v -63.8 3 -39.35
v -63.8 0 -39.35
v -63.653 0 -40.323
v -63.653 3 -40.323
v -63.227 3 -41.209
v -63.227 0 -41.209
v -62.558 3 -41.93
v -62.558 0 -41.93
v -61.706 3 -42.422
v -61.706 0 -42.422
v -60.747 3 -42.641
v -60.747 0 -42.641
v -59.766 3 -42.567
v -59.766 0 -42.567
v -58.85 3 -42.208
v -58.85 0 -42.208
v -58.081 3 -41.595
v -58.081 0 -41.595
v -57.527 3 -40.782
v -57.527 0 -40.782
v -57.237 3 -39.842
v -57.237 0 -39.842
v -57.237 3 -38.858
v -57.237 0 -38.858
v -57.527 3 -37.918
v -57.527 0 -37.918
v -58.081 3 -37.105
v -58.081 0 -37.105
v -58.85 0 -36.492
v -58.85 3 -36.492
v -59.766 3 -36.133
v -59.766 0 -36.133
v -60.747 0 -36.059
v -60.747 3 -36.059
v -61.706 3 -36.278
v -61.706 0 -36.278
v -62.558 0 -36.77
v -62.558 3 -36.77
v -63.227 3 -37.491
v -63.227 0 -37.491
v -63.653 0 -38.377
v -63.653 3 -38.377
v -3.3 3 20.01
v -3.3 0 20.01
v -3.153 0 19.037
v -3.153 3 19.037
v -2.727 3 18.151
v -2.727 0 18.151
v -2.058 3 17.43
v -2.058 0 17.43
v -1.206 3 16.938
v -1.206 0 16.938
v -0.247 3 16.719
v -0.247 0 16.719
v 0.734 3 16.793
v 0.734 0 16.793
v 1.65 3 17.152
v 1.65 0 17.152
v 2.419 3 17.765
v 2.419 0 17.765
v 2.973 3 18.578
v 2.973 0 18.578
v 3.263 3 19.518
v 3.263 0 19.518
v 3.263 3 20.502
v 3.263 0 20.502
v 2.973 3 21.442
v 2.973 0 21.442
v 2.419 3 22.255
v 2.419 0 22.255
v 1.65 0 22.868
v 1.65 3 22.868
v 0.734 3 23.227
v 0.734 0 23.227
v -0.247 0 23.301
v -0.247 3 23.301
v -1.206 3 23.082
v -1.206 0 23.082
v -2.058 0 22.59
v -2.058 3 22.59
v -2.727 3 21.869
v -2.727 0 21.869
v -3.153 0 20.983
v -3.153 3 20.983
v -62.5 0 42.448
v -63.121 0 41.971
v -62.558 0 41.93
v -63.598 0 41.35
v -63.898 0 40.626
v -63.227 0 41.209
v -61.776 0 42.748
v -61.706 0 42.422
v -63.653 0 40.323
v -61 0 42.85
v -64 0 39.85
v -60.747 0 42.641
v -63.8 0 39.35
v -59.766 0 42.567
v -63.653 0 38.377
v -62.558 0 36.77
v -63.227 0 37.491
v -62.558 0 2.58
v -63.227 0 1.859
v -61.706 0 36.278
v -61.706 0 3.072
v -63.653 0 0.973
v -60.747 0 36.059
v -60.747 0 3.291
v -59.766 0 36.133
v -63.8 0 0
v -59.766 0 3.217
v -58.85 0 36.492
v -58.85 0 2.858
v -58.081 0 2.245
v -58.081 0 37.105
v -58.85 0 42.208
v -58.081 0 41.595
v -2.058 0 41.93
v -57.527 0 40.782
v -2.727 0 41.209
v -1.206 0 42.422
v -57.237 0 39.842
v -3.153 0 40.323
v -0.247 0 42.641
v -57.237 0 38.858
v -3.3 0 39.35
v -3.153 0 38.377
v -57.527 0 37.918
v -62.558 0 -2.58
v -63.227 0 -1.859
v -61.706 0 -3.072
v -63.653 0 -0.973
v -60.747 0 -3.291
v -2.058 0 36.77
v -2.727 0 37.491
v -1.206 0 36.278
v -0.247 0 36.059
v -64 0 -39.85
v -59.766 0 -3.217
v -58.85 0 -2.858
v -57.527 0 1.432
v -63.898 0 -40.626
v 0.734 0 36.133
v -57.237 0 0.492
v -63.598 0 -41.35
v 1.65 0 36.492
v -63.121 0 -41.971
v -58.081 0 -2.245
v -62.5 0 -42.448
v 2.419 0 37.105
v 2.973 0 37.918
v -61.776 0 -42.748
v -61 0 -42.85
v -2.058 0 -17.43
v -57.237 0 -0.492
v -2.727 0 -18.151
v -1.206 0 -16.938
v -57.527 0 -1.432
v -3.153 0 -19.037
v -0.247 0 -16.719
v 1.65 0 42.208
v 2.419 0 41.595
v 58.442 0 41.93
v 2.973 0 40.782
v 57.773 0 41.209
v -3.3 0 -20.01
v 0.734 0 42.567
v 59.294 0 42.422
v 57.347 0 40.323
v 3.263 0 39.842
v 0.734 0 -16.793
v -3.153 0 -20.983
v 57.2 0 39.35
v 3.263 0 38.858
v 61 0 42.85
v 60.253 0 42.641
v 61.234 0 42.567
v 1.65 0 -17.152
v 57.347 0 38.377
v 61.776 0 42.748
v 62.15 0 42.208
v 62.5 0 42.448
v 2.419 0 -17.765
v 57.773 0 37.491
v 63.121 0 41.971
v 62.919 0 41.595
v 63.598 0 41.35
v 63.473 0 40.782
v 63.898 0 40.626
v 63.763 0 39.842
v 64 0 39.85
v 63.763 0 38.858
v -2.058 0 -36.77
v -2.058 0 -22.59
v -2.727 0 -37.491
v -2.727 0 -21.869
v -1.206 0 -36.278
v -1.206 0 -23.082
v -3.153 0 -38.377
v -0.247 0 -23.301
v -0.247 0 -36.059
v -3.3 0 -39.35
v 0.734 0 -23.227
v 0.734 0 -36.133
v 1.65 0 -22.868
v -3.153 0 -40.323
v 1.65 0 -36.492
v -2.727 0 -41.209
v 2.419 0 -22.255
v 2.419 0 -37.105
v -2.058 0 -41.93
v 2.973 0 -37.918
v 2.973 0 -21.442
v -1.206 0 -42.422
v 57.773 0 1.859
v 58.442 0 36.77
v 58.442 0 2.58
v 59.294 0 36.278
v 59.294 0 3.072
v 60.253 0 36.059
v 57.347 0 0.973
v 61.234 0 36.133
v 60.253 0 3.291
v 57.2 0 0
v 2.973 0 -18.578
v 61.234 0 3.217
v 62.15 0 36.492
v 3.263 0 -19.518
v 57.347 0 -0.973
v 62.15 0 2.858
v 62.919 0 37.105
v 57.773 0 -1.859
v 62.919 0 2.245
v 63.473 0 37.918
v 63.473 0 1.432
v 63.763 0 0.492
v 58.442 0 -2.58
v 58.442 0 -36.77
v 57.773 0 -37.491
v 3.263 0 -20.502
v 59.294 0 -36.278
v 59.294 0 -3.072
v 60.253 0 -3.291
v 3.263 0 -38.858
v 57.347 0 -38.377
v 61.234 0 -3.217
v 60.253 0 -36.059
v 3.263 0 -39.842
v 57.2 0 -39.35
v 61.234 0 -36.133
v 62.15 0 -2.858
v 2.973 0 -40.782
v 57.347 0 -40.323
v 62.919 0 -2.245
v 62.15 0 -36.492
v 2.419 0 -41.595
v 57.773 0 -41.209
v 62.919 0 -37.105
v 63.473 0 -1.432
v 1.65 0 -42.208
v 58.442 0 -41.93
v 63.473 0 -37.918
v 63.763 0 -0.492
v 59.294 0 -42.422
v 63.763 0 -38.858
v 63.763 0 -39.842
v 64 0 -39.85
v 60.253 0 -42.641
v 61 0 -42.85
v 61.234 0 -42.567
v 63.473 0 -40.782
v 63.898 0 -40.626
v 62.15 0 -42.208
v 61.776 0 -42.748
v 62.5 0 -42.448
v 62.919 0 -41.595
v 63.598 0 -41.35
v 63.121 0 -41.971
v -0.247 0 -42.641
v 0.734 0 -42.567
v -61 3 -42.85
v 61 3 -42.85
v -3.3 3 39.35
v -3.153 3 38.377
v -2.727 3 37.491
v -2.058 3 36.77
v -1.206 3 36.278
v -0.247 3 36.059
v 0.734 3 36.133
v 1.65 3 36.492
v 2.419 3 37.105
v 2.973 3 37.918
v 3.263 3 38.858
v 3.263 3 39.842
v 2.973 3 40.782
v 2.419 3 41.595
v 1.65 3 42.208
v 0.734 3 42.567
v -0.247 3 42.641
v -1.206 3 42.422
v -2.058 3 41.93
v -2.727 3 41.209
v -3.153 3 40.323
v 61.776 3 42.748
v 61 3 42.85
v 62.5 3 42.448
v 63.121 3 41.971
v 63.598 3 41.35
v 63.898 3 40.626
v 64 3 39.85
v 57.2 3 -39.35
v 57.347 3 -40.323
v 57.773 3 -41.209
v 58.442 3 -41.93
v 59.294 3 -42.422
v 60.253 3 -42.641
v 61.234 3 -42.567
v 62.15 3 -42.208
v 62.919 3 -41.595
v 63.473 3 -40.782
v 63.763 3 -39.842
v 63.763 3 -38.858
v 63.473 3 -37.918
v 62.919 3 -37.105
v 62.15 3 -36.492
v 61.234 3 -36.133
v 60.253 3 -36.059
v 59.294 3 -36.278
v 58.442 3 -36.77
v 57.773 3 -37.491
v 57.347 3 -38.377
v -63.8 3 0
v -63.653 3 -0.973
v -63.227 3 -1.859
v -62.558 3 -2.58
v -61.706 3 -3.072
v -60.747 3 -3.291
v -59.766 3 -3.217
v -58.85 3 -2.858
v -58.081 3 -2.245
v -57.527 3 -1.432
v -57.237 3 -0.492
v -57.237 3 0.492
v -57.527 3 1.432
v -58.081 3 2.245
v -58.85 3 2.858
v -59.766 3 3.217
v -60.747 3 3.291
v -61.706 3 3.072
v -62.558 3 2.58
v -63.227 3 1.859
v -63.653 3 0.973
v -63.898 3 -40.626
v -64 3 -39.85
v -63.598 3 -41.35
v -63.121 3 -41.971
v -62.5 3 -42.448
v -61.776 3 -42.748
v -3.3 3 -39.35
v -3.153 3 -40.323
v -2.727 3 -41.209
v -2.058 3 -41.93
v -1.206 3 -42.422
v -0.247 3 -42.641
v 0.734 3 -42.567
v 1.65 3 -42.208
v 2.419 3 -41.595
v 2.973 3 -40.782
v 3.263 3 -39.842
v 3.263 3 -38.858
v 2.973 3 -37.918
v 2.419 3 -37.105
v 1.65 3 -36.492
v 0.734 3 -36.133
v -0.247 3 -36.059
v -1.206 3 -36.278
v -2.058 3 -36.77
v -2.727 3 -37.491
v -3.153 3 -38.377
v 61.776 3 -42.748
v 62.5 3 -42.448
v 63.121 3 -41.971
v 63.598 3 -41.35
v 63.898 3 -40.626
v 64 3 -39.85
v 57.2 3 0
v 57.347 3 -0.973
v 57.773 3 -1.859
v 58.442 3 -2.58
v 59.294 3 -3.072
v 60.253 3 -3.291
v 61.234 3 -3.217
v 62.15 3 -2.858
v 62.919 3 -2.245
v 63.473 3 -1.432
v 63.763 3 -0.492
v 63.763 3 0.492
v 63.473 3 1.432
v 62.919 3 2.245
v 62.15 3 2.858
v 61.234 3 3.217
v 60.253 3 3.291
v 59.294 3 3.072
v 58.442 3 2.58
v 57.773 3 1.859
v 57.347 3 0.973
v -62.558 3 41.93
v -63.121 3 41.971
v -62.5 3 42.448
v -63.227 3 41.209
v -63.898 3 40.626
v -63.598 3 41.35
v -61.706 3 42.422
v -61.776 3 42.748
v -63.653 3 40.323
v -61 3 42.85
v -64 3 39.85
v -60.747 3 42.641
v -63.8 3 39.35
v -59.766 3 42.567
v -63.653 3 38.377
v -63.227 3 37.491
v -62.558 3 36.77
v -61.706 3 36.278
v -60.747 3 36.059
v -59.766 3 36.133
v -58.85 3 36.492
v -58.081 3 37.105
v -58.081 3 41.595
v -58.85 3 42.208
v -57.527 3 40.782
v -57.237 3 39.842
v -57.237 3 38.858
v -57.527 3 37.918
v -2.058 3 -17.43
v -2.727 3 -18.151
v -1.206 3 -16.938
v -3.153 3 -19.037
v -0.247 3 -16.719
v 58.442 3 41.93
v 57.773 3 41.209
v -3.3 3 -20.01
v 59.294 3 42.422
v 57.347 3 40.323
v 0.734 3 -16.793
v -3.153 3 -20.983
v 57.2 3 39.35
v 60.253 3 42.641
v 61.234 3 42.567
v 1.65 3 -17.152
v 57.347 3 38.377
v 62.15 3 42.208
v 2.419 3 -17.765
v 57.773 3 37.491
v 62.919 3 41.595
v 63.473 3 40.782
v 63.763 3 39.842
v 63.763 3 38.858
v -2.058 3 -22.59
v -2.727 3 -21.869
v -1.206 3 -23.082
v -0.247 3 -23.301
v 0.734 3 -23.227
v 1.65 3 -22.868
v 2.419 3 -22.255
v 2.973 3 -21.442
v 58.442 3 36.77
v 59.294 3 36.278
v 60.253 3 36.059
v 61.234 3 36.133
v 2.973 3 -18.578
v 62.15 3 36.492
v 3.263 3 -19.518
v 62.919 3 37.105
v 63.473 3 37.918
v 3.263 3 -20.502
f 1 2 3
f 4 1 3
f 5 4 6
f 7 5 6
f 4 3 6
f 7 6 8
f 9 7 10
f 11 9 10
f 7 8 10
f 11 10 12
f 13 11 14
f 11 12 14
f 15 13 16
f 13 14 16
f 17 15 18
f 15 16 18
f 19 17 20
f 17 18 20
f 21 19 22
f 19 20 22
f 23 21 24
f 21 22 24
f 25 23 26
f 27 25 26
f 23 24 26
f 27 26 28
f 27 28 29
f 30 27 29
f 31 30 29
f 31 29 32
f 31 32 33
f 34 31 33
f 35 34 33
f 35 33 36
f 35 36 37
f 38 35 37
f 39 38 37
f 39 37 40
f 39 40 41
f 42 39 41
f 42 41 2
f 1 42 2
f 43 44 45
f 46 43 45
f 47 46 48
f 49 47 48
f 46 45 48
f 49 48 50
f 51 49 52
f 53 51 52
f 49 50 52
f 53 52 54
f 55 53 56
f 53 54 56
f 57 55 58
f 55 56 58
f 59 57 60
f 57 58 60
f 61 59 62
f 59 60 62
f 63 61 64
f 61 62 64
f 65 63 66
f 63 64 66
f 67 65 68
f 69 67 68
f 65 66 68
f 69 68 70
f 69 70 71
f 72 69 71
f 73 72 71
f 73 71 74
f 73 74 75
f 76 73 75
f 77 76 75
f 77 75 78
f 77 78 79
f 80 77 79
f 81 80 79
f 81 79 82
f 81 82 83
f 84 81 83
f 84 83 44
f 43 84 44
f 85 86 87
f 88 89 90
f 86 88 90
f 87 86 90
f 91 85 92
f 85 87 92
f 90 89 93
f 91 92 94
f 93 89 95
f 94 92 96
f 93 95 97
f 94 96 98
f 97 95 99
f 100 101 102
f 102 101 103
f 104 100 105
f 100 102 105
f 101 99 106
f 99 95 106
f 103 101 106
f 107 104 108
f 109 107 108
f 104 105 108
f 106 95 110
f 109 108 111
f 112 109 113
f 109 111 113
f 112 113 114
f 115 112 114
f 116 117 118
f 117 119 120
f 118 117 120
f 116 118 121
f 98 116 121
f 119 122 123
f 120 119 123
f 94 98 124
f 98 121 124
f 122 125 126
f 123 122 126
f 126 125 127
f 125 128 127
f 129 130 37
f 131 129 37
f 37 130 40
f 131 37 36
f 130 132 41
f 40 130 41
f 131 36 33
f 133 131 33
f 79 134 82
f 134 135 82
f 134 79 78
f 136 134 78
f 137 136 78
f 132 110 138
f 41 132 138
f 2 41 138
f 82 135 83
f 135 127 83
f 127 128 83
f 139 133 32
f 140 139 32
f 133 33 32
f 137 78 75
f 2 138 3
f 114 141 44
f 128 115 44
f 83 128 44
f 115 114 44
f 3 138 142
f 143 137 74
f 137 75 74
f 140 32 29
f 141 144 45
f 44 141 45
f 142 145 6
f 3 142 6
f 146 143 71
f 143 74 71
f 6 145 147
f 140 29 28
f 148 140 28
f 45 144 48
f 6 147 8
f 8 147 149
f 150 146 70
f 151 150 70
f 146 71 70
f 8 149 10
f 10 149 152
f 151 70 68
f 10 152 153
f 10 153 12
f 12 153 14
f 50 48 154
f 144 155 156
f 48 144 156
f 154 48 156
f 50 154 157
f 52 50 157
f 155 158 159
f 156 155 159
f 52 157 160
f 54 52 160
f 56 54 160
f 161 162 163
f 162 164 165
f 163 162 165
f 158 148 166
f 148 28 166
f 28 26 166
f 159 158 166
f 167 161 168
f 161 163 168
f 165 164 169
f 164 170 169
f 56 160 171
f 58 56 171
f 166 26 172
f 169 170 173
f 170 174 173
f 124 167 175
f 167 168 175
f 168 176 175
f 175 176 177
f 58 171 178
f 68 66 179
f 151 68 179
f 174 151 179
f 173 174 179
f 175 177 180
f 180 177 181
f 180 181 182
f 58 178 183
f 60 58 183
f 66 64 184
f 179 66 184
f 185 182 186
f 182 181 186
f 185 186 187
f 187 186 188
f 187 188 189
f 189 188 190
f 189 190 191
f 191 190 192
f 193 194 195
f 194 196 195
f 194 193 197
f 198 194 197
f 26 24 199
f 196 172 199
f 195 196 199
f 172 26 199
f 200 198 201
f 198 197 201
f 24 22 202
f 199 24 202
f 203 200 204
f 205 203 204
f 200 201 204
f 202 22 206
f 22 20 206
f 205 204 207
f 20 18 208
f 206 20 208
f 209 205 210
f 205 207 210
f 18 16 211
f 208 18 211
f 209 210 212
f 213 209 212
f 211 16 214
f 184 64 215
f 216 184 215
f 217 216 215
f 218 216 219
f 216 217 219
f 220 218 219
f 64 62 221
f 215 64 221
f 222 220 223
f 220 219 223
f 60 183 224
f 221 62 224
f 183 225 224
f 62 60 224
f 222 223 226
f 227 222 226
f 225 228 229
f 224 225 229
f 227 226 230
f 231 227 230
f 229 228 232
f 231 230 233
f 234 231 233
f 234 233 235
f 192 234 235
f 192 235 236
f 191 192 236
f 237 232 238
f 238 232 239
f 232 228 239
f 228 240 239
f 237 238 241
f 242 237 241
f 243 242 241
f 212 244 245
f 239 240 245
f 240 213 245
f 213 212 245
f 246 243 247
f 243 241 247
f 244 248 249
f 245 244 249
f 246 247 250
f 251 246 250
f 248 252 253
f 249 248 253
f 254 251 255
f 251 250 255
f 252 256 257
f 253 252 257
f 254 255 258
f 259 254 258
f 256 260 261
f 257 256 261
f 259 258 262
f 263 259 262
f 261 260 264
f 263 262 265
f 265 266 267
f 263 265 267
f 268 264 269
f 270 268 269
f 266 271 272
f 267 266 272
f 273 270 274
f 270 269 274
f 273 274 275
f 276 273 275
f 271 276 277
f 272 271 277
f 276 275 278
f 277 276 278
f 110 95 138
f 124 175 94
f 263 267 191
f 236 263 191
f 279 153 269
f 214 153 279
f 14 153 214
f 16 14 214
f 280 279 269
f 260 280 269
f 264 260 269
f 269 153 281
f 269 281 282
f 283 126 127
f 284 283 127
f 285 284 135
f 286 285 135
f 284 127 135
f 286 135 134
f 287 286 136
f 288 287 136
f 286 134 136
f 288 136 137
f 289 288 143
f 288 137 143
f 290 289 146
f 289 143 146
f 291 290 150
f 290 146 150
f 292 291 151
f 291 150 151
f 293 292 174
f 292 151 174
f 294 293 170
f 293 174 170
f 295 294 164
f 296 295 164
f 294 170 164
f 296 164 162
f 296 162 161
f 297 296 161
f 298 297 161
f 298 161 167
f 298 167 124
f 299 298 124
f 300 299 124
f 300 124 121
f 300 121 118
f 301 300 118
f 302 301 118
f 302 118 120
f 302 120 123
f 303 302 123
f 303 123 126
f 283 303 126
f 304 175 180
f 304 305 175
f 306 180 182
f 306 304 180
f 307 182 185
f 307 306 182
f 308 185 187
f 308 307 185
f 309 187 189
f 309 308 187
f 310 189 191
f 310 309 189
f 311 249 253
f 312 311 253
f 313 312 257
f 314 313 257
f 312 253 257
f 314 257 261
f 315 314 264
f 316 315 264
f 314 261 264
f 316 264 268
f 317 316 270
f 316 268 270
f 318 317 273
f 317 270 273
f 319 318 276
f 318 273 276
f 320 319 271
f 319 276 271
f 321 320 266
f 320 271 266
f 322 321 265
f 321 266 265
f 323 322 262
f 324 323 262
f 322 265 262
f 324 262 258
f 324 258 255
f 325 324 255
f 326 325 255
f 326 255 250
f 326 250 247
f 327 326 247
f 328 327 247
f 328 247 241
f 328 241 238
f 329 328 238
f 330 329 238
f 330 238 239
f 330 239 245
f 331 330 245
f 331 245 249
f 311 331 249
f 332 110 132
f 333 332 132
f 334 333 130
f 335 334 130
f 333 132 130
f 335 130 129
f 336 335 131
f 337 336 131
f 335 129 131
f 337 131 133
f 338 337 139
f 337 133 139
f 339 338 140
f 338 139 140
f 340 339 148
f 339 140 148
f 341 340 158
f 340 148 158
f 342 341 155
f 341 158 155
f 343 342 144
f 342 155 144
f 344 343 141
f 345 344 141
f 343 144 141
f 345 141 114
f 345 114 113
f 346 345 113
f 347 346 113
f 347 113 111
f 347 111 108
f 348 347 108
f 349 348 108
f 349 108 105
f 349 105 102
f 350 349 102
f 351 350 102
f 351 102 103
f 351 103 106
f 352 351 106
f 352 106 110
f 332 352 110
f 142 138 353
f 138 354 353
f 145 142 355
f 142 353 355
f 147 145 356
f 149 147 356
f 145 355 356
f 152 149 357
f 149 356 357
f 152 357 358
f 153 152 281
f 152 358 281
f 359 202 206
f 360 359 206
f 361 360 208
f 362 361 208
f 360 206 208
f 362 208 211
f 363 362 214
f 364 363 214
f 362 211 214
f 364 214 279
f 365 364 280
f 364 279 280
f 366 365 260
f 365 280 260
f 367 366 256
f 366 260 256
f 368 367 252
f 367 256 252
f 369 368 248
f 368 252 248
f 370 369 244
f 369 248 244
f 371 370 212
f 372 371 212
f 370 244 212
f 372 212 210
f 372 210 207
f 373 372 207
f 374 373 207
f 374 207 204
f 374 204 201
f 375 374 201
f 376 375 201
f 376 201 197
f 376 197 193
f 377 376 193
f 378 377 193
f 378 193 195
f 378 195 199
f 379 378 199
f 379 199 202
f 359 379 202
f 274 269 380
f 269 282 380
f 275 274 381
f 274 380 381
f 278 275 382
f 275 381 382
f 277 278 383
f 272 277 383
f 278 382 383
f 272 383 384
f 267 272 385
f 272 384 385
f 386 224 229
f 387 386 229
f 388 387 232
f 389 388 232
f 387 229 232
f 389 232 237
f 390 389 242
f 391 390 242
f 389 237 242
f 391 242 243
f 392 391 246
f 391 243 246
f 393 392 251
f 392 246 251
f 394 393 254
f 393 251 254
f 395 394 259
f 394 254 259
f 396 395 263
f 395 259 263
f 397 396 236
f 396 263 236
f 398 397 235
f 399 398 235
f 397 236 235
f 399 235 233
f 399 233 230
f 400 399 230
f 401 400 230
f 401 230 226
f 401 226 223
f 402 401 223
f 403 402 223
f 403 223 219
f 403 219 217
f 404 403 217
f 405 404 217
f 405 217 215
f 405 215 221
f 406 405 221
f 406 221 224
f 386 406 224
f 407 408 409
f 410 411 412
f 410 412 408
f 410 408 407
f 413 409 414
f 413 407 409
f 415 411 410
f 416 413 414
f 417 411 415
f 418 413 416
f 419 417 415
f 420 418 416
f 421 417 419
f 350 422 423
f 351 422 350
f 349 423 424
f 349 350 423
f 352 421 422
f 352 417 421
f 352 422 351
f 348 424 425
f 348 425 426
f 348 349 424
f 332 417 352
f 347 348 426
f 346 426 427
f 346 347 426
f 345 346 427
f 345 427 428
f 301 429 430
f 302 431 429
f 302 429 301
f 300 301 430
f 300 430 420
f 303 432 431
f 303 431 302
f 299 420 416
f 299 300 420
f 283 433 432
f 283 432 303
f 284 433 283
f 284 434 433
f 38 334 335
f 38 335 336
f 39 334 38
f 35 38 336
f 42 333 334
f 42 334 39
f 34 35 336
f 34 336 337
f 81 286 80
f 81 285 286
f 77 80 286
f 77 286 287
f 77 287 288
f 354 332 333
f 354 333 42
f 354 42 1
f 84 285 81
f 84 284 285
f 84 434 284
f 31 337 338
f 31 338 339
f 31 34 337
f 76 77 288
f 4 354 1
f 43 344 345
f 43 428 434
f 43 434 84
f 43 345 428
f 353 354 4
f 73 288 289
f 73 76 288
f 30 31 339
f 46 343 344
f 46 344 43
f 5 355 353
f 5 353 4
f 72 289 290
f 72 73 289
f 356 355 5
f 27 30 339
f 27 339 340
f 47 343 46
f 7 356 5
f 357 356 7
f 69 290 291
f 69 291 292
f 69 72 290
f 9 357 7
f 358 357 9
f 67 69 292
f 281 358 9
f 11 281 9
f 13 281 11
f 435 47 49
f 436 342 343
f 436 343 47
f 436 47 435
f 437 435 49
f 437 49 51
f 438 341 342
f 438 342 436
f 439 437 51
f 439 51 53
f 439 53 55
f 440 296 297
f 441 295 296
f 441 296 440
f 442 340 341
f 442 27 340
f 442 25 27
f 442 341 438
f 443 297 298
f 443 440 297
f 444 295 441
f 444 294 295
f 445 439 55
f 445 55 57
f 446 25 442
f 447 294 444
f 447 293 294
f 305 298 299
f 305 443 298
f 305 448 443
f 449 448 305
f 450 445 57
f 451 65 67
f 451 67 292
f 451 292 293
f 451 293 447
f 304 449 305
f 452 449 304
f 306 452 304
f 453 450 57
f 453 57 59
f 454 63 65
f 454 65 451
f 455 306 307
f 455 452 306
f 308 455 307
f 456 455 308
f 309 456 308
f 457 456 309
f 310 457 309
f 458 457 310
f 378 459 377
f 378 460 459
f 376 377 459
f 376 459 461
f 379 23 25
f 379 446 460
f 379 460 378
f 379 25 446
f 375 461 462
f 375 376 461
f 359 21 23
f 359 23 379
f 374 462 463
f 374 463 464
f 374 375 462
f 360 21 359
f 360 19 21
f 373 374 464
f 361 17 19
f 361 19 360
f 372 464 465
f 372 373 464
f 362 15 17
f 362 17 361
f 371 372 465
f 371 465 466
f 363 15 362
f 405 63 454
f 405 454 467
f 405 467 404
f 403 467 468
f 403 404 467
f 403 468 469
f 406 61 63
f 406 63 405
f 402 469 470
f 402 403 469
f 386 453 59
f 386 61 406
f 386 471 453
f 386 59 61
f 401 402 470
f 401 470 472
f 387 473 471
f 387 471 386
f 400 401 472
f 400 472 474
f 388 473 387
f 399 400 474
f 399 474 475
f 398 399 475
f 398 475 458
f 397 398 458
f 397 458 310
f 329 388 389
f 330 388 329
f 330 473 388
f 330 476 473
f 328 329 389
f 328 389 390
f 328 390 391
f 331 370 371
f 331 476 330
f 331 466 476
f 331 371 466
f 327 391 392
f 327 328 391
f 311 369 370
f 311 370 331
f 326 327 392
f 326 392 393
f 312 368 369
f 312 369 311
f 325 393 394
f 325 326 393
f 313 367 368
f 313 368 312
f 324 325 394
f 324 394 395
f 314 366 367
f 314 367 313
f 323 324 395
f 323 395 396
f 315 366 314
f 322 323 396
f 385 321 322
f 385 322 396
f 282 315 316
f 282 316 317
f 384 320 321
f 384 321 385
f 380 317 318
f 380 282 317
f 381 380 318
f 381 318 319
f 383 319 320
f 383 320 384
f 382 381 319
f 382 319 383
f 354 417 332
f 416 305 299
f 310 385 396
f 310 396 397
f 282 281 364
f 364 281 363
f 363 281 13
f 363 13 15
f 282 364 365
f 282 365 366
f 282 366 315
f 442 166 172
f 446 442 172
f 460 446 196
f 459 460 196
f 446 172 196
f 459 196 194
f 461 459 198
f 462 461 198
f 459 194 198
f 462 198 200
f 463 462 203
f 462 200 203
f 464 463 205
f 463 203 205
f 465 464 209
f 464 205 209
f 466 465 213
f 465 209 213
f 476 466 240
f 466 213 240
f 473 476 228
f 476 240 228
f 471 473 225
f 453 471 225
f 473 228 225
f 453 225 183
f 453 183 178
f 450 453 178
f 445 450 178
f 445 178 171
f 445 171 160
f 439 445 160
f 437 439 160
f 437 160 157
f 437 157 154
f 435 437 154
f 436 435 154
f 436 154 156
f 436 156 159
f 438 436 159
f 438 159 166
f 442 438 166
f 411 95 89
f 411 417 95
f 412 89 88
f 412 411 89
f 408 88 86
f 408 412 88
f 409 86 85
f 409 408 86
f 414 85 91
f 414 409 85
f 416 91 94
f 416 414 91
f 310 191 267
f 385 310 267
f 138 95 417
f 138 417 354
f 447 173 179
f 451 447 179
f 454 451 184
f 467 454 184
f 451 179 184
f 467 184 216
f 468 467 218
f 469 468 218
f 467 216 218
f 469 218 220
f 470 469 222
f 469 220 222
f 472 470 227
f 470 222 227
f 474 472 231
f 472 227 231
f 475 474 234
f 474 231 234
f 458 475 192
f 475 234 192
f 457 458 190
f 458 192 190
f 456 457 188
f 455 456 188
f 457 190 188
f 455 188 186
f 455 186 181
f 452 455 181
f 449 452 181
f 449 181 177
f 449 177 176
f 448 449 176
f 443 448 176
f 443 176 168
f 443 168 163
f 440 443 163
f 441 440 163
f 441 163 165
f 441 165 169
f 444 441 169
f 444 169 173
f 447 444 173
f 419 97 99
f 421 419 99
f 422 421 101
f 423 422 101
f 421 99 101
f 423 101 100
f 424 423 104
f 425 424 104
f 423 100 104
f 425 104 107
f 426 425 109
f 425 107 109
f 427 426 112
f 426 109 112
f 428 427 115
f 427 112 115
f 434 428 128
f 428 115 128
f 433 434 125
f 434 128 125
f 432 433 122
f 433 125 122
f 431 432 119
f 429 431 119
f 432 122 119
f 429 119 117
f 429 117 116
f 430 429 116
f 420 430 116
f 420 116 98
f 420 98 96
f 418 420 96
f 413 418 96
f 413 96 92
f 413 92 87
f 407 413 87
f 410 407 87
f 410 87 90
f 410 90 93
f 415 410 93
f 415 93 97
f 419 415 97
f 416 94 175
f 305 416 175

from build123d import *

# Parameters (mm, degrees)
SKETCH1_W            = 128
SKETCH1_H            = 85.7
BOSS_EXTRUDE1_DEPTH  = 3
M6_CLEARANCE_HOLE1_D = 6.6
FILLET1_R            = 3


with BuildPart() as part:
    # Sketch1 → Boss-Extrude1 (new body)
    with BuildSketch(Plane(origin=(0, 0, 0), x_dir=(1, 0, 0), z_dir=(0, 1, 0))):
        Rectangle(SKETCH1_W, SKETCH1_H)
    extrude(amount=BOSS_EXTRUDE1_DEPTH)

    # M6 Clearance Hole1 (through all)
    with Locations(Plane(origin=(0, 3, 0), x_dir=(1, 0, 0), z_dir=(0, 1, 0))):
        with Locations((-60.5, 39.35), (0, 39.35), (60.5, 39.35), (60.5, 0), (60.5, -39.35), (0, -39.35), (-60.5, -39.35), (-60.5, 0), (0, -20.01), (0, 20.01)):
            Hole(M6_CLEARANCE_HOLE1_D / 2)

    # Fillet1
    fillet1_edges = [part.edges().sort_by_distance(p)[0] for p in [
        (64, 1.5, 42.85),
        (-64, 1.5, 42.85),
        (-64, 1.5, -42.85),
        (64, 1.5, -42.85),
    ]]
    fillet(fillet1_edges, radius=FILLET1_R)


solid = part.part
